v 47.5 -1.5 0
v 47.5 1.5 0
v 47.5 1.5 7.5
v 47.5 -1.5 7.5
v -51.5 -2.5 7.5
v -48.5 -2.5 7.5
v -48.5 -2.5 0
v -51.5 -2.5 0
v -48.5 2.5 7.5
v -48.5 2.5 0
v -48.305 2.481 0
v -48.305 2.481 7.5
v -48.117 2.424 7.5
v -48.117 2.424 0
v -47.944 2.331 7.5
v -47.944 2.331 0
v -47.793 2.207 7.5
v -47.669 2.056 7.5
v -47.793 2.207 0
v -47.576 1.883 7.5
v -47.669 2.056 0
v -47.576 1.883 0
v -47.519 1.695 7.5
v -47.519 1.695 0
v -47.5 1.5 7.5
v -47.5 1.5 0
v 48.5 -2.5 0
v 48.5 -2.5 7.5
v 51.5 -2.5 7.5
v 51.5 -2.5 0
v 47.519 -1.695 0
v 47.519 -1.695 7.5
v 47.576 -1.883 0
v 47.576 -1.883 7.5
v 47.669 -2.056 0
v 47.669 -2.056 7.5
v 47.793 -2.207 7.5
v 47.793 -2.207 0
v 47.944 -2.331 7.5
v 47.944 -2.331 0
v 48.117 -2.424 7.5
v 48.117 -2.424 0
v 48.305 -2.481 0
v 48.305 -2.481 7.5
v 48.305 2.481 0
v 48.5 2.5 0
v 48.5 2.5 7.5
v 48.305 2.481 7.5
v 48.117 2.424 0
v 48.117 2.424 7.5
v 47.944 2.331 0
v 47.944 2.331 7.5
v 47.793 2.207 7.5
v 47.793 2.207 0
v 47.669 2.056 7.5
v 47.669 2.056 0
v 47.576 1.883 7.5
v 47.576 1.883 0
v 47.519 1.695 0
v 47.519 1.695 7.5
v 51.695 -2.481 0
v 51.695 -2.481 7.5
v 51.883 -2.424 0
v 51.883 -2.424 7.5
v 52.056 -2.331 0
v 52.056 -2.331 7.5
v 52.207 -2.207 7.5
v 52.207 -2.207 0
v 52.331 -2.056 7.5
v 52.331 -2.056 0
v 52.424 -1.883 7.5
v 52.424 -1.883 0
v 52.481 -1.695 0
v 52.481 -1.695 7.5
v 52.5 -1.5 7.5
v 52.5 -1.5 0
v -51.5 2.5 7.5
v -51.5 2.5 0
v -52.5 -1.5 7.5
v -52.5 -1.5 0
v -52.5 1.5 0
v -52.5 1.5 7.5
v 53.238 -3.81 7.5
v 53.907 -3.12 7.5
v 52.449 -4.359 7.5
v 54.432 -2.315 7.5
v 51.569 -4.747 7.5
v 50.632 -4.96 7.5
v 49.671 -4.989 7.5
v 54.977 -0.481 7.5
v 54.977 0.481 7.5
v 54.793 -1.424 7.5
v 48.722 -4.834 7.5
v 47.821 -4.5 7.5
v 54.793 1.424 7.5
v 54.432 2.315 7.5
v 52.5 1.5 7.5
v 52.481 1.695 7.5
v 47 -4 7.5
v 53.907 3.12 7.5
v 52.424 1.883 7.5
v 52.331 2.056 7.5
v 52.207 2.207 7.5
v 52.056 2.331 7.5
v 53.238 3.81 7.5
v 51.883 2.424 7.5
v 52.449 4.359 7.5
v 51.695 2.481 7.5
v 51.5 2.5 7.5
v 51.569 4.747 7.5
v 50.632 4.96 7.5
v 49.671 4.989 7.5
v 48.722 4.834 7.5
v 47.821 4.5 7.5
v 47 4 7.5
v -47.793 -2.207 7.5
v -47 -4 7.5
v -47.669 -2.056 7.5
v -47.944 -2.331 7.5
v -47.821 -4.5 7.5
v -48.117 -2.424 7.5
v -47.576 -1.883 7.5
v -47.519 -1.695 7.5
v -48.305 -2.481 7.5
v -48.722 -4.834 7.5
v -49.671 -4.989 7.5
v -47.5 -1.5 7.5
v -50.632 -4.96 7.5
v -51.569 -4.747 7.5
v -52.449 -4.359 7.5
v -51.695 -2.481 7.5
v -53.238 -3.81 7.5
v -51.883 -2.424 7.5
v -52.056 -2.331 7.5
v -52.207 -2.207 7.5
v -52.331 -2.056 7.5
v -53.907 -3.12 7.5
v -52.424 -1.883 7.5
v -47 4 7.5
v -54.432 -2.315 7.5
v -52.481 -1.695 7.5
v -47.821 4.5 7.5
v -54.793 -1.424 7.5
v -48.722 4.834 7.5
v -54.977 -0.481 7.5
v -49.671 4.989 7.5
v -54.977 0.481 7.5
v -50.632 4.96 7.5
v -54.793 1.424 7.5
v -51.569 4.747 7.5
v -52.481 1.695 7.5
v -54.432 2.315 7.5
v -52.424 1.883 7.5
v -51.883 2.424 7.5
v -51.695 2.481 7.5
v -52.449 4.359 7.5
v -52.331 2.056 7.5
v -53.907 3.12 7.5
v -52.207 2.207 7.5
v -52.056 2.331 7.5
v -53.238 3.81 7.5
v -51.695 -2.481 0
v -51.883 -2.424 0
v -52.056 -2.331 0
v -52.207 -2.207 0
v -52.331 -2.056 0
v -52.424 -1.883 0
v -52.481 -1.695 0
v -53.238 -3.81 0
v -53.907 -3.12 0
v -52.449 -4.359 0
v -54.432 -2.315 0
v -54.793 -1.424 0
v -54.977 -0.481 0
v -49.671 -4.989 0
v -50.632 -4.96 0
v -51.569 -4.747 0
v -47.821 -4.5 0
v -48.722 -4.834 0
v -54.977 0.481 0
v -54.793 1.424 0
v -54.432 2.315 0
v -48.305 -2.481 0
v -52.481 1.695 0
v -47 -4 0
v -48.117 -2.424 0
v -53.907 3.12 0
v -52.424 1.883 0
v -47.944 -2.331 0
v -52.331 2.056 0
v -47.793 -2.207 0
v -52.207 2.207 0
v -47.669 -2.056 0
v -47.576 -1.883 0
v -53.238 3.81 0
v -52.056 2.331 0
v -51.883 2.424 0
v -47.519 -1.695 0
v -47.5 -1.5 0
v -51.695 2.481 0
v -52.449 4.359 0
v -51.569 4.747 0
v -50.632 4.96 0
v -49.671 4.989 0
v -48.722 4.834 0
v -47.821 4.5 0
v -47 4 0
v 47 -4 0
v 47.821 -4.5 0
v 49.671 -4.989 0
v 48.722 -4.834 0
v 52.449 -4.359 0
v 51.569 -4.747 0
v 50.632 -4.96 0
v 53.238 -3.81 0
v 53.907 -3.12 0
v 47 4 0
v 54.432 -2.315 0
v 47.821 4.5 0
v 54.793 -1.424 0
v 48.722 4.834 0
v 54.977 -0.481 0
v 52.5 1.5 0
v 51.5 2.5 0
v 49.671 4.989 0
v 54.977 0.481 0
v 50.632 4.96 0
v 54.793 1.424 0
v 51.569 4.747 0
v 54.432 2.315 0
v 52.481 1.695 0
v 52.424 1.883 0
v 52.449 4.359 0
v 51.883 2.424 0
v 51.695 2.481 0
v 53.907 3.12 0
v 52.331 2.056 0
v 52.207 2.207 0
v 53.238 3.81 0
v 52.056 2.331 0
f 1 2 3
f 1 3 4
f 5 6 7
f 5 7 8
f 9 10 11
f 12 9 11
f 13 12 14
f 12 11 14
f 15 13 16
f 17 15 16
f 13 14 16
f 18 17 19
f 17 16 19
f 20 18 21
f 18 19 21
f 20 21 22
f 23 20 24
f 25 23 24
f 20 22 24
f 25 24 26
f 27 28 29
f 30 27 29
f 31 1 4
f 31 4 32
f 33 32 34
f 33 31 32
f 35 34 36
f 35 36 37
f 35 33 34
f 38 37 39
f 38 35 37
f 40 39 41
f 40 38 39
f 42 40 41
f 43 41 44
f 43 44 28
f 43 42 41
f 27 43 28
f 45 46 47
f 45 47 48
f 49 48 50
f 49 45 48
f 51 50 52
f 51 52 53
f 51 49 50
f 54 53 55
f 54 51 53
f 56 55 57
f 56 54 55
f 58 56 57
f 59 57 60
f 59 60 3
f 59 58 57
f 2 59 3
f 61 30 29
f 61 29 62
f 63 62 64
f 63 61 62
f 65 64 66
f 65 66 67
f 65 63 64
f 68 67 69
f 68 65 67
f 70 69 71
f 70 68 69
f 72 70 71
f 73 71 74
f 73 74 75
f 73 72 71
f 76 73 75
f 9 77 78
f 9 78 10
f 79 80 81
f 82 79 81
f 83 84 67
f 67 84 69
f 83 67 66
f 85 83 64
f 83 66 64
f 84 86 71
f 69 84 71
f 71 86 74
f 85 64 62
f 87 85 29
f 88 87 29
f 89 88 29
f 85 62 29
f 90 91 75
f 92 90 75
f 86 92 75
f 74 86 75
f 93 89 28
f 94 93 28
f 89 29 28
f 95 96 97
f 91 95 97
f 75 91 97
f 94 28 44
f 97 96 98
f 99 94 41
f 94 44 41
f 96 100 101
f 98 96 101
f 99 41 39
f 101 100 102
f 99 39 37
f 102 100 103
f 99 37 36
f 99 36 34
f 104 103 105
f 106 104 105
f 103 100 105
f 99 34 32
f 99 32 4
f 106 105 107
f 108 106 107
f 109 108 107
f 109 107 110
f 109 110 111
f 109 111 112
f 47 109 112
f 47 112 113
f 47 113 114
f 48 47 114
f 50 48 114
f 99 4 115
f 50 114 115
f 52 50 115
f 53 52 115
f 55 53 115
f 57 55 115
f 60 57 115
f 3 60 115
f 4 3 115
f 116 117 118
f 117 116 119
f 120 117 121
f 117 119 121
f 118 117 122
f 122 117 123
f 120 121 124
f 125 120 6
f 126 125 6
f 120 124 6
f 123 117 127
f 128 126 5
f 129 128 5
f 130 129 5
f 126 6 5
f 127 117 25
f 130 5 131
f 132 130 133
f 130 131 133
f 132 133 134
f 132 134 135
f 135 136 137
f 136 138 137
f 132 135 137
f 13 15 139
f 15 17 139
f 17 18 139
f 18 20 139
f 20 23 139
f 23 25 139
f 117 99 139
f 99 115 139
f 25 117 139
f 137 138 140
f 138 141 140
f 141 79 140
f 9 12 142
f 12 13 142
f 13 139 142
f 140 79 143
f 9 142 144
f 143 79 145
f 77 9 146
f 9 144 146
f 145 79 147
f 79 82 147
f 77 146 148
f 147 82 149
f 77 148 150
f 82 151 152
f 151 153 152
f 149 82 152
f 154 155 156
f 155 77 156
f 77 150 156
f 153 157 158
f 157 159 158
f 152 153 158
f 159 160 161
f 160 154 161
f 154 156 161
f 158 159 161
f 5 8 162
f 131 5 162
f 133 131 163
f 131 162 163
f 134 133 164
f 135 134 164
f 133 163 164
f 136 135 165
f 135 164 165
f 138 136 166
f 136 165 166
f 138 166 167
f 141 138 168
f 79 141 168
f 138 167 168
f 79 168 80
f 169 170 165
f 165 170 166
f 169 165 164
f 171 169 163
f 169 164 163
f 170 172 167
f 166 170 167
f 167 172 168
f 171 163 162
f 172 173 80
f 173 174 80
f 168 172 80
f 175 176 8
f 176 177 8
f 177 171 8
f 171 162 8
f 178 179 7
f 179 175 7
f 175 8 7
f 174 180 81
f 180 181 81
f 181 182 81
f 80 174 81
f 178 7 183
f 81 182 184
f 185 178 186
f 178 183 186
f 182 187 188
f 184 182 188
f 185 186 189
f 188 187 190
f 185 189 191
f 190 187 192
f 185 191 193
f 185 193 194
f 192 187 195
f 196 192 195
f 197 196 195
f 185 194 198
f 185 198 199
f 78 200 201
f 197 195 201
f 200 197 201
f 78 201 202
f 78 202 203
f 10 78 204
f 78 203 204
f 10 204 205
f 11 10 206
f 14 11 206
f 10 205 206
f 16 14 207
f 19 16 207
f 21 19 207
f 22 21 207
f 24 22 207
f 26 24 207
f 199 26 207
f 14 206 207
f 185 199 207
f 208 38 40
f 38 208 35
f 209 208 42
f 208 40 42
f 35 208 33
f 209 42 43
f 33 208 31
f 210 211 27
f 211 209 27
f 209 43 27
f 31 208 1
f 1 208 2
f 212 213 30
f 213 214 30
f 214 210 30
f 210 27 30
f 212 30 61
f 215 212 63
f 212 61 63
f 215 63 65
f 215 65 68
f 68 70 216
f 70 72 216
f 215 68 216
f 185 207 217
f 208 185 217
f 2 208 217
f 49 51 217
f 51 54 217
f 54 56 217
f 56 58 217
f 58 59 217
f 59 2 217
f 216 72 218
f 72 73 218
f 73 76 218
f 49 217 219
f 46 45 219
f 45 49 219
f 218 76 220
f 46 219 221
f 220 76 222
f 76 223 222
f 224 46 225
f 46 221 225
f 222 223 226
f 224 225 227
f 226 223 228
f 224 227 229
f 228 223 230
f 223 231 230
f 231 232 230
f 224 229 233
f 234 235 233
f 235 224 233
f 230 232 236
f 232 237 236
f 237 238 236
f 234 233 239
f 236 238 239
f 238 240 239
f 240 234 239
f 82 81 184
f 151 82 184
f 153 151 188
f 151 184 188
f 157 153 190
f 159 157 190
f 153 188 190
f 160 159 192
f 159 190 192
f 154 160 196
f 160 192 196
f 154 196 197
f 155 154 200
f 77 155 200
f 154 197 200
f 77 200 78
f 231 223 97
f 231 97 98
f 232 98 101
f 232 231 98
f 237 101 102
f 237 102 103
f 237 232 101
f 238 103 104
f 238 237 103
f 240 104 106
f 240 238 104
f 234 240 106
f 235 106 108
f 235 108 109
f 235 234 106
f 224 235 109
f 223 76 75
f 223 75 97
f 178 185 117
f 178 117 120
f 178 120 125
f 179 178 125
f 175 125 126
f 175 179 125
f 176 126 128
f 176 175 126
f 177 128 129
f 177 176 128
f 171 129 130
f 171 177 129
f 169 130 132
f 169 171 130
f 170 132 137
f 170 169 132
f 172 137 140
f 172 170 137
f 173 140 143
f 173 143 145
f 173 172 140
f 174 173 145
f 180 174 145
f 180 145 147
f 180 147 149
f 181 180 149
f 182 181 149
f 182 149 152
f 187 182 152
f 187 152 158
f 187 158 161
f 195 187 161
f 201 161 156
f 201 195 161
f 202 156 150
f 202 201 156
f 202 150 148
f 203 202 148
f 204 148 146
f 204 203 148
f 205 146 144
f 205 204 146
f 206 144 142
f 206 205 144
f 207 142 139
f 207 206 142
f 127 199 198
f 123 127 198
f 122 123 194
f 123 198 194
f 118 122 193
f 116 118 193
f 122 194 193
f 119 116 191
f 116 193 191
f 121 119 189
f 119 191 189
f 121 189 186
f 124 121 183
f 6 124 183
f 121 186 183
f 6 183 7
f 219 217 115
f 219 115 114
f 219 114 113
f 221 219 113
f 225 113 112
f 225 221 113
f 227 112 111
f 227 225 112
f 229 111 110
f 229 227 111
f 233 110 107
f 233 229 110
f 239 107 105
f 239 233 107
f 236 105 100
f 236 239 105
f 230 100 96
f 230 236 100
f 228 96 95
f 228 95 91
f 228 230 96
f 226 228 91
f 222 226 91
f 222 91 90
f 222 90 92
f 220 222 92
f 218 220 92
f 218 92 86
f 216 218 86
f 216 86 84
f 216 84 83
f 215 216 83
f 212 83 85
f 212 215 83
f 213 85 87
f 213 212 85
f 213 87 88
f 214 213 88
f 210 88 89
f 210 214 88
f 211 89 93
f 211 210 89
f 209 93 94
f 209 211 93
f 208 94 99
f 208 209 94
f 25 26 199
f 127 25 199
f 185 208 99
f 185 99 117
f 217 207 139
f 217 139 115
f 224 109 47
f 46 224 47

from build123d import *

# Parameters (mm, degrees)
SKETCH1_R           = 2.5
BOSS_EXTRUDE1_DEPTH = 7.5


with BuildPart() as part:
    # Sketch1 → Boss-Extrude1 (new body)
    # profile 1 of 2: a face of its own
    with BuildSketch(Plane.XY):
        with BuildLine():
            ThreePointArc((47, 4), (55, 0), (47, -4))
            Line((47, -4), (-47, -4))
            ThreePointArc((-47, -4), (-55, 0), (-47, 4))
            Line((-47, 4), (47, 4))
        make_face()
        Circle(SKETCH1_R, mode=Mode.SUBTRACT)
        with BuildLine():
            ThreePointArc((52.5, 1.5), (52.207106781, 2.207106781), (51.5, 2.5))
            Line((51.5, 2.5), (48.5, 2.5))
            ThreePointArc((48.5, 2.5), (47.792893219, 2.207106781), (47.5, 1.5))
            Line((47.5, 1.5), (47.5, -1.5))
            ThreePointArc((47.5, -1.5), (47.792893219, -2.207106781), (48.5, -2.5))
            Line((48.5, -2.5), (51.5, -2.5))
            ThreePointArc((51.5, -2.5), (52.207106781, -2.207106781), (52.5, -1.5))
            Line((52.5, -1.5), (52.5, 1.5))
        make_face(mode=Mode.SUBTRACT)
        with BuildLine():
            Line((-52.5, -1.5), (-52.5, 1.5))
            ThreePointArc((-52.5, 1.5), (-52.207106781, 2.207106781), (-51.5, 2.5))
            Line((-51.5, 2.5), (-48.5, 2.5))
            ThreePointArc((-48.5, 2.5), (-47.792893219, 2.207106781), (-47.5, 1.5))
            Line((-47.5, 1.5), (-47.5, -1.5))
            ThreePointArc((-47.5, -1.5), (-47.792893219, -2.207106781), (-48.5, -2.5))
            Line((-48.5, -2.5), (-51.5, -2.5))
            ThreePointArc((-51.5, -2.5), (-52.207106781, -2.207106781), (-52.5, -1.5))
        make_face(mode=Mode.SUBTRACT)
    # profile 2 of 2: a face of its own
    with BuildSketch(Plane.XY):
        Circle(SKETCH1_R)
    extrude(amount=BOSS_EXTRUDE1_DEPTH)


solid = part.part
